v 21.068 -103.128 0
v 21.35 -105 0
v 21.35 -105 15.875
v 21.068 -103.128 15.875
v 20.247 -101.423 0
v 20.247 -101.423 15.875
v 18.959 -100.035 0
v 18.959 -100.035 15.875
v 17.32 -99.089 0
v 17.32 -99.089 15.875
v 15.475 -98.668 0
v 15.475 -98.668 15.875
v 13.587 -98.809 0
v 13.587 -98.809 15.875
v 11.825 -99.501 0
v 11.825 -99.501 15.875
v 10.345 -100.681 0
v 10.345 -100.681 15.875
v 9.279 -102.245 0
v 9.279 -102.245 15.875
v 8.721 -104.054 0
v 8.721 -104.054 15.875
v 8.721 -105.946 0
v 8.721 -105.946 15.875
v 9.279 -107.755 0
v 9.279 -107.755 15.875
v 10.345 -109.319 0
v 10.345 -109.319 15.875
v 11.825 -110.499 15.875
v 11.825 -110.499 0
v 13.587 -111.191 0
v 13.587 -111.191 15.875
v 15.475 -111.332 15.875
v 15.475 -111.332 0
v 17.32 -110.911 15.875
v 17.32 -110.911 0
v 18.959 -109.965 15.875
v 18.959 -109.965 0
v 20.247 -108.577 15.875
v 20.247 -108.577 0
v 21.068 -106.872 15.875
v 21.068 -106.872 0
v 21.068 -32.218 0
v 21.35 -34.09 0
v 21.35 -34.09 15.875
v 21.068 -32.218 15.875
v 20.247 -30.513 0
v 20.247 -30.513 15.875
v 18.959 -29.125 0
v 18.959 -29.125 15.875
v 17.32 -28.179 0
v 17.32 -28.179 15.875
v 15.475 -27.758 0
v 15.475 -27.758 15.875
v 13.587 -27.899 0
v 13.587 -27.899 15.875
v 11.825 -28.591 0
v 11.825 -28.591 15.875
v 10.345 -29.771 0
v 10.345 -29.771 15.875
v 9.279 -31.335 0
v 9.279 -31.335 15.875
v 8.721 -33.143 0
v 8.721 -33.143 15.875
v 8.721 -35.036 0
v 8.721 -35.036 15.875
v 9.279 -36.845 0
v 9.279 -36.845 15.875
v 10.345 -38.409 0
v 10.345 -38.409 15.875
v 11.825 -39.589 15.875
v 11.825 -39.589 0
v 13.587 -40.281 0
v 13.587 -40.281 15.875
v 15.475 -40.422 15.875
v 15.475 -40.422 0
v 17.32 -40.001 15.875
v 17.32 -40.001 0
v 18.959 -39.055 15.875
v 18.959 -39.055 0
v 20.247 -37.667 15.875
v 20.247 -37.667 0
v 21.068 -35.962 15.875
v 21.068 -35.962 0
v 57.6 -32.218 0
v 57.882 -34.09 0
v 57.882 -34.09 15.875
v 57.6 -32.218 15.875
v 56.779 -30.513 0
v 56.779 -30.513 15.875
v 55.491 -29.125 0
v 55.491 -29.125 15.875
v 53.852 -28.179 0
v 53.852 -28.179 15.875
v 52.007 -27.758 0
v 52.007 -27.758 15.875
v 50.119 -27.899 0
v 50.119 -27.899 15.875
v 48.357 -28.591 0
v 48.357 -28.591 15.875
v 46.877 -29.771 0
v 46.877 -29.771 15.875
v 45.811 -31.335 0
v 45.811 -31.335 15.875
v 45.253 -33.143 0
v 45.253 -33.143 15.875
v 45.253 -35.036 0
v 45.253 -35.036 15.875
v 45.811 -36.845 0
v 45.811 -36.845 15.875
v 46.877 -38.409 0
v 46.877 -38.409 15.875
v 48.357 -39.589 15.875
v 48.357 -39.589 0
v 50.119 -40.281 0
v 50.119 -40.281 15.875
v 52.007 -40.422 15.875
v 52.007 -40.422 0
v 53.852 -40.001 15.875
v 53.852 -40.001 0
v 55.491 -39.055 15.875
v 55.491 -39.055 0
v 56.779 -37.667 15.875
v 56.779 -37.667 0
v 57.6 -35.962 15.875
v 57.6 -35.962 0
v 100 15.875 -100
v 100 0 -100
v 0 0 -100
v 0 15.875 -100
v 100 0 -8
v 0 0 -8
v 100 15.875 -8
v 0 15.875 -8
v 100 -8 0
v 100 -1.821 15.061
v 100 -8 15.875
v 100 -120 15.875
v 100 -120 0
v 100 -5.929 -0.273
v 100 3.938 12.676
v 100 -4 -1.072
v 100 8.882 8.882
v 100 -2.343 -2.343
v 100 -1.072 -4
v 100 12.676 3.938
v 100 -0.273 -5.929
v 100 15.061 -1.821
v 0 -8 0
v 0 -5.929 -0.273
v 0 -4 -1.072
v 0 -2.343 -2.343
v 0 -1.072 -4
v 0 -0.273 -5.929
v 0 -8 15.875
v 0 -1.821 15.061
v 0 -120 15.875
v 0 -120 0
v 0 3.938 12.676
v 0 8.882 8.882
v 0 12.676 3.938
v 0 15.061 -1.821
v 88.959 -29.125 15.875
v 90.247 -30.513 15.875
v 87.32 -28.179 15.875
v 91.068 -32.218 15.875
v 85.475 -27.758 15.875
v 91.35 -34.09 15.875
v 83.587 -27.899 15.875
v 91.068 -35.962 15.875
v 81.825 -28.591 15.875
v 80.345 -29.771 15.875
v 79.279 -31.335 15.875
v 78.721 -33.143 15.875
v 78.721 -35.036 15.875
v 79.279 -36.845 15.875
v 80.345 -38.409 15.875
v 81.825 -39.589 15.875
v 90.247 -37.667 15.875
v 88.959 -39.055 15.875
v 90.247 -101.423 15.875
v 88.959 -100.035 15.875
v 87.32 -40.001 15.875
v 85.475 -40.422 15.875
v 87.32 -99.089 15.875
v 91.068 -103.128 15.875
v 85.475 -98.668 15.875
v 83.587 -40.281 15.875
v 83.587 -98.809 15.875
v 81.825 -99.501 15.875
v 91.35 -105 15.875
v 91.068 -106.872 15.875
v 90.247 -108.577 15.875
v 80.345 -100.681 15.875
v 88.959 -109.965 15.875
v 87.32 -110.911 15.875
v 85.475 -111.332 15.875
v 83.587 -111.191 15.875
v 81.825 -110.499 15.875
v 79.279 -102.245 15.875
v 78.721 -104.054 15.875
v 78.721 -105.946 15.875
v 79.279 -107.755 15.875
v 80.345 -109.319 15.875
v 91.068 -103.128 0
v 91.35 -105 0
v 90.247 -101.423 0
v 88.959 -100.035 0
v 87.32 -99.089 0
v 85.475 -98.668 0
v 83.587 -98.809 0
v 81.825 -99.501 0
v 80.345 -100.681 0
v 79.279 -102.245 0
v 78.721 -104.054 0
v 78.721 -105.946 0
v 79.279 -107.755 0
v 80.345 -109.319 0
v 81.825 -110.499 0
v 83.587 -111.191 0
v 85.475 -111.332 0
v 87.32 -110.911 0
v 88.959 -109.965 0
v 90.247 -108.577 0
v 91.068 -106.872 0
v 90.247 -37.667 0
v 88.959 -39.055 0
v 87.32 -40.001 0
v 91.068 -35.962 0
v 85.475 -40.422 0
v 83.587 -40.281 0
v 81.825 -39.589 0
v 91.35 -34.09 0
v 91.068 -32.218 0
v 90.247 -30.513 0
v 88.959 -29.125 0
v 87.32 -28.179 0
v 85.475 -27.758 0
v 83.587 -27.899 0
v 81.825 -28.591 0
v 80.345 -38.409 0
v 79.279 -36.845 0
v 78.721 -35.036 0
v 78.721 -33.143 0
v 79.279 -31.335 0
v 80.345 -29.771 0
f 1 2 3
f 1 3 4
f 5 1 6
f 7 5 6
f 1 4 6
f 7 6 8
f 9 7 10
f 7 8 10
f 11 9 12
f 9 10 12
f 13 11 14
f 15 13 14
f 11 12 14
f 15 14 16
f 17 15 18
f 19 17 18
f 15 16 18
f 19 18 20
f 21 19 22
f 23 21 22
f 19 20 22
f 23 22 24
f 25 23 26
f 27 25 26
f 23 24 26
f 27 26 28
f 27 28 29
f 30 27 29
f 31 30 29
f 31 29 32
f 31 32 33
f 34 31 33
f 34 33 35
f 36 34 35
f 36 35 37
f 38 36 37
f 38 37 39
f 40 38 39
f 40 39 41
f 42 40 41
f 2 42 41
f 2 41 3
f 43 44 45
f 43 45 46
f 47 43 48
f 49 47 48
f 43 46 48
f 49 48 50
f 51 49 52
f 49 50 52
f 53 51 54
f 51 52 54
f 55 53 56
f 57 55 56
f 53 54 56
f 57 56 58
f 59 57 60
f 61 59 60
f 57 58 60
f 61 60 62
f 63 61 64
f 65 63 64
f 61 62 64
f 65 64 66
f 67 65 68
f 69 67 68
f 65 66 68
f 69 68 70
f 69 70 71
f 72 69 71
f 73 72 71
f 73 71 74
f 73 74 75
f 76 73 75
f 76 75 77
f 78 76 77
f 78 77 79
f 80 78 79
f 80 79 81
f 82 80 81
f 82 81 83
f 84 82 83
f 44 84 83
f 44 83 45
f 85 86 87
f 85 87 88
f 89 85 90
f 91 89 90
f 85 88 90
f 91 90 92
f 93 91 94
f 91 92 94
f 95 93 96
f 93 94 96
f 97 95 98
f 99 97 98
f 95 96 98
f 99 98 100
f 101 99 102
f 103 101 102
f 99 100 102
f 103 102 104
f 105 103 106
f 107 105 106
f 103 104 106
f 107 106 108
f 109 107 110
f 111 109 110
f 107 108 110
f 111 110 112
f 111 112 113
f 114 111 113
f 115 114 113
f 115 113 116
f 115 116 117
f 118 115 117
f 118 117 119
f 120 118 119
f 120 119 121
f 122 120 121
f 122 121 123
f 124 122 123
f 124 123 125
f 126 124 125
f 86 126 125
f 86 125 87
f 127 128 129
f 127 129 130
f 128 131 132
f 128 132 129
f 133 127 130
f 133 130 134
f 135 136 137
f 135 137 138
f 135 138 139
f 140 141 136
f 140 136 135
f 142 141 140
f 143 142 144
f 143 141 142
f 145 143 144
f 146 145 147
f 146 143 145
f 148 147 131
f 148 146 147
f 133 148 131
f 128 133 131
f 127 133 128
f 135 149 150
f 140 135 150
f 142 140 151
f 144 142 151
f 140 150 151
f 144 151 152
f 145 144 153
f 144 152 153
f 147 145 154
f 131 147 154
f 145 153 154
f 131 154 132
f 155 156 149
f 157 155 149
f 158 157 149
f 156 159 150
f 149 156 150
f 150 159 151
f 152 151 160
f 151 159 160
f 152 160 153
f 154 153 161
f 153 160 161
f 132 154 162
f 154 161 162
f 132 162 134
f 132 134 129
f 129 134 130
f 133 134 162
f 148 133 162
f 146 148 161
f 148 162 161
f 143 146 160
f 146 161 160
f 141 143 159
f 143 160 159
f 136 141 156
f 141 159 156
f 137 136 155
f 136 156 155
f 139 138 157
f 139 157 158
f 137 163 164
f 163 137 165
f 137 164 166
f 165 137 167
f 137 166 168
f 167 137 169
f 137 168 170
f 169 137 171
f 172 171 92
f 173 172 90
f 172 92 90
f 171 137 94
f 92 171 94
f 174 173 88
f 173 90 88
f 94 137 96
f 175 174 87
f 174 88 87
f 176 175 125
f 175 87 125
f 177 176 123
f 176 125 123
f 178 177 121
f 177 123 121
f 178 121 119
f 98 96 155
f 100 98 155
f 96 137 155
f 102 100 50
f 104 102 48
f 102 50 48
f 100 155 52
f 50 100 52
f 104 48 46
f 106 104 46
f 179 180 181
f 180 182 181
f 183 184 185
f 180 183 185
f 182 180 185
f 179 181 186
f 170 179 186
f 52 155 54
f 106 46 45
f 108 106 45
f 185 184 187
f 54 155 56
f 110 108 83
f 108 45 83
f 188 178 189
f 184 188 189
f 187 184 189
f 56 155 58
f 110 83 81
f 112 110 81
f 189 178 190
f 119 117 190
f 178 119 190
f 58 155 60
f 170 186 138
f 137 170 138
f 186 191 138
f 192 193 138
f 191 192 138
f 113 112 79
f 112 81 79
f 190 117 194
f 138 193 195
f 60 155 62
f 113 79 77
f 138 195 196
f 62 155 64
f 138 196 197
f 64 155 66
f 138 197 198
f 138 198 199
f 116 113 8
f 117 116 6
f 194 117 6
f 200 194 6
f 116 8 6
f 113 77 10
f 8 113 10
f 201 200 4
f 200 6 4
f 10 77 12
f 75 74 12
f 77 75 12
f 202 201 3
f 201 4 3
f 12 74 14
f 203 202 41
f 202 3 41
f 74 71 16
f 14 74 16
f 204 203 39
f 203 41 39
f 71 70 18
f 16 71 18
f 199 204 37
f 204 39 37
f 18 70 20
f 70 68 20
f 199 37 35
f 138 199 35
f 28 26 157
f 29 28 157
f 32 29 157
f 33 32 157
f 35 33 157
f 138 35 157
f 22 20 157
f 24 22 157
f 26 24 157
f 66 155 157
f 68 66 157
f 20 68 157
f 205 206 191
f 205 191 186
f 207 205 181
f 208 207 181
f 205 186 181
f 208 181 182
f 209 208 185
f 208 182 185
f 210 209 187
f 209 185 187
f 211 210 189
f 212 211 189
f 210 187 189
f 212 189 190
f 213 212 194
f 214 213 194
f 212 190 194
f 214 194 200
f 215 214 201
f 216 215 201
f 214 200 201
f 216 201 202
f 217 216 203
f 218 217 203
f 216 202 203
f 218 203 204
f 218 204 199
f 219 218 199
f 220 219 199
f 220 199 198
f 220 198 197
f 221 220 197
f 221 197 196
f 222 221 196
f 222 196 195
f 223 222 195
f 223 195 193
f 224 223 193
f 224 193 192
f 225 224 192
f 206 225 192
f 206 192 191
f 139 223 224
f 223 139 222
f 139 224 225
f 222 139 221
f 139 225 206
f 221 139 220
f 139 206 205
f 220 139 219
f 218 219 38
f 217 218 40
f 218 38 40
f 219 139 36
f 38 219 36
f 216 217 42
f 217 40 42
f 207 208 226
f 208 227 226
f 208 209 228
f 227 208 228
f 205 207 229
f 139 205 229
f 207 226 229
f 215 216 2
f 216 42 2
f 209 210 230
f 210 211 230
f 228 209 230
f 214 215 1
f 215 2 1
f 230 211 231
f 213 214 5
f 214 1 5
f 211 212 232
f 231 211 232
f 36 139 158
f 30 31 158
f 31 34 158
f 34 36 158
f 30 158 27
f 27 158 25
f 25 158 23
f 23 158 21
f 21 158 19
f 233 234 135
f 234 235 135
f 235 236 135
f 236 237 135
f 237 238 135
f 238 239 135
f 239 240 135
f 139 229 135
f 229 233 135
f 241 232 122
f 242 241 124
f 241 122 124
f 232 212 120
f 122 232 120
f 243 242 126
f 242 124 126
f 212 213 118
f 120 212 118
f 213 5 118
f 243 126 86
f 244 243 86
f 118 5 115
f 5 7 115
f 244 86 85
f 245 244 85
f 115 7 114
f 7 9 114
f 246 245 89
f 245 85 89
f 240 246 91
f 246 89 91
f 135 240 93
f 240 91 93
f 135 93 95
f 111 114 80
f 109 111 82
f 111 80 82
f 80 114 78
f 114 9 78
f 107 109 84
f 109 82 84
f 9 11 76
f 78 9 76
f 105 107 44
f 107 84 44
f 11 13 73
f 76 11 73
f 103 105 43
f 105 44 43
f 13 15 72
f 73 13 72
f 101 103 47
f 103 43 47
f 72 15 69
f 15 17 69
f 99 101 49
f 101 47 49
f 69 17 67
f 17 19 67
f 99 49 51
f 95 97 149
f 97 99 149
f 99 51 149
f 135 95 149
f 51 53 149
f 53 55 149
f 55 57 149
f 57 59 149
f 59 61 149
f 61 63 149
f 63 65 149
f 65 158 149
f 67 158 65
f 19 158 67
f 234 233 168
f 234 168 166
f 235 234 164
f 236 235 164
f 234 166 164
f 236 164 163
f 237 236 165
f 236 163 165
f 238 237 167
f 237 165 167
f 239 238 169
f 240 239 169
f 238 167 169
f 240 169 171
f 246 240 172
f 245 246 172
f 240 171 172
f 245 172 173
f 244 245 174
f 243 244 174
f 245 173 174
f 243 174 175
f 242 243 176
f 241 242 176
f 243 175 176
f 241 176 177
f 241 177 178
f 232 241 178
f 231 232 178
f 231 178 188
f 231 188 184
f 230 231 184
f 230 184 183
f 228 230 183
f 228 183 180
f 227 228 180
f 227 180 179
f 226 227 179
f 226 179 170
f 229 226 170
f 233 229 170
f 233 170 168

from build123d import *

# Parameters (mm, degrees)
SALIENTE_EXTRUIR1_DEPTH = 100
CROQUIS2_R              = 6.35
CORTAR_EXTRUIR1_DEPTH   = 100


with BuildPart() as part:
    # Croquis1 → Saliente-Extruir1 (new body)
    with BuildSketch(Plane(origin=(0, 0, 0), x_dir=(0, 0, -1), z_dir=(1, 0, 0))):
        with BuildLine():
            Line((8, 0), (100, 0))
            Line((100, 0), (100, 15.875))
            Line((100, 15.875), (8, 15.875))
            ThreePointArc((8, 15.875), (-8.882174401, 8.882174401), (-15.875, -8))
            Line((-15.875, -8), (-15.875, -120))
            Line((-15.875, -120), (0, -120))
            Line((0, -120), (0, -8))
            ThreePointArc((0, -8), (2.343145751, -2.343145751), (8, 0))
        make_face()
    extrude(amount=SALIENTE_EXTRUIR1_DEPTH)

    # Croquis2 → Cortar-Extruir1 (cut)
    with BuildSketch(Plane.XY.offset(15.875)):
        with Locations((15, -34.089894909)):
            Circle(CROQUIS2_R)
        with Locations((85, -34.089894909)):
            Circle(CROQUIS2_R)
        with Locations((15, -105)):
            Circle(CROQUIS2_R)
        with Locations((85, -105)):
            Circle(CROQUIS2_R)
        with Locations((51.532189387, -34.089894909)):
            Circle(CROQUIS2_R)
    extrude(amount=-CORTAR_EXTRUIR1_DEPTH, mode=Mode.SUBTRACT)


solid = part.part
